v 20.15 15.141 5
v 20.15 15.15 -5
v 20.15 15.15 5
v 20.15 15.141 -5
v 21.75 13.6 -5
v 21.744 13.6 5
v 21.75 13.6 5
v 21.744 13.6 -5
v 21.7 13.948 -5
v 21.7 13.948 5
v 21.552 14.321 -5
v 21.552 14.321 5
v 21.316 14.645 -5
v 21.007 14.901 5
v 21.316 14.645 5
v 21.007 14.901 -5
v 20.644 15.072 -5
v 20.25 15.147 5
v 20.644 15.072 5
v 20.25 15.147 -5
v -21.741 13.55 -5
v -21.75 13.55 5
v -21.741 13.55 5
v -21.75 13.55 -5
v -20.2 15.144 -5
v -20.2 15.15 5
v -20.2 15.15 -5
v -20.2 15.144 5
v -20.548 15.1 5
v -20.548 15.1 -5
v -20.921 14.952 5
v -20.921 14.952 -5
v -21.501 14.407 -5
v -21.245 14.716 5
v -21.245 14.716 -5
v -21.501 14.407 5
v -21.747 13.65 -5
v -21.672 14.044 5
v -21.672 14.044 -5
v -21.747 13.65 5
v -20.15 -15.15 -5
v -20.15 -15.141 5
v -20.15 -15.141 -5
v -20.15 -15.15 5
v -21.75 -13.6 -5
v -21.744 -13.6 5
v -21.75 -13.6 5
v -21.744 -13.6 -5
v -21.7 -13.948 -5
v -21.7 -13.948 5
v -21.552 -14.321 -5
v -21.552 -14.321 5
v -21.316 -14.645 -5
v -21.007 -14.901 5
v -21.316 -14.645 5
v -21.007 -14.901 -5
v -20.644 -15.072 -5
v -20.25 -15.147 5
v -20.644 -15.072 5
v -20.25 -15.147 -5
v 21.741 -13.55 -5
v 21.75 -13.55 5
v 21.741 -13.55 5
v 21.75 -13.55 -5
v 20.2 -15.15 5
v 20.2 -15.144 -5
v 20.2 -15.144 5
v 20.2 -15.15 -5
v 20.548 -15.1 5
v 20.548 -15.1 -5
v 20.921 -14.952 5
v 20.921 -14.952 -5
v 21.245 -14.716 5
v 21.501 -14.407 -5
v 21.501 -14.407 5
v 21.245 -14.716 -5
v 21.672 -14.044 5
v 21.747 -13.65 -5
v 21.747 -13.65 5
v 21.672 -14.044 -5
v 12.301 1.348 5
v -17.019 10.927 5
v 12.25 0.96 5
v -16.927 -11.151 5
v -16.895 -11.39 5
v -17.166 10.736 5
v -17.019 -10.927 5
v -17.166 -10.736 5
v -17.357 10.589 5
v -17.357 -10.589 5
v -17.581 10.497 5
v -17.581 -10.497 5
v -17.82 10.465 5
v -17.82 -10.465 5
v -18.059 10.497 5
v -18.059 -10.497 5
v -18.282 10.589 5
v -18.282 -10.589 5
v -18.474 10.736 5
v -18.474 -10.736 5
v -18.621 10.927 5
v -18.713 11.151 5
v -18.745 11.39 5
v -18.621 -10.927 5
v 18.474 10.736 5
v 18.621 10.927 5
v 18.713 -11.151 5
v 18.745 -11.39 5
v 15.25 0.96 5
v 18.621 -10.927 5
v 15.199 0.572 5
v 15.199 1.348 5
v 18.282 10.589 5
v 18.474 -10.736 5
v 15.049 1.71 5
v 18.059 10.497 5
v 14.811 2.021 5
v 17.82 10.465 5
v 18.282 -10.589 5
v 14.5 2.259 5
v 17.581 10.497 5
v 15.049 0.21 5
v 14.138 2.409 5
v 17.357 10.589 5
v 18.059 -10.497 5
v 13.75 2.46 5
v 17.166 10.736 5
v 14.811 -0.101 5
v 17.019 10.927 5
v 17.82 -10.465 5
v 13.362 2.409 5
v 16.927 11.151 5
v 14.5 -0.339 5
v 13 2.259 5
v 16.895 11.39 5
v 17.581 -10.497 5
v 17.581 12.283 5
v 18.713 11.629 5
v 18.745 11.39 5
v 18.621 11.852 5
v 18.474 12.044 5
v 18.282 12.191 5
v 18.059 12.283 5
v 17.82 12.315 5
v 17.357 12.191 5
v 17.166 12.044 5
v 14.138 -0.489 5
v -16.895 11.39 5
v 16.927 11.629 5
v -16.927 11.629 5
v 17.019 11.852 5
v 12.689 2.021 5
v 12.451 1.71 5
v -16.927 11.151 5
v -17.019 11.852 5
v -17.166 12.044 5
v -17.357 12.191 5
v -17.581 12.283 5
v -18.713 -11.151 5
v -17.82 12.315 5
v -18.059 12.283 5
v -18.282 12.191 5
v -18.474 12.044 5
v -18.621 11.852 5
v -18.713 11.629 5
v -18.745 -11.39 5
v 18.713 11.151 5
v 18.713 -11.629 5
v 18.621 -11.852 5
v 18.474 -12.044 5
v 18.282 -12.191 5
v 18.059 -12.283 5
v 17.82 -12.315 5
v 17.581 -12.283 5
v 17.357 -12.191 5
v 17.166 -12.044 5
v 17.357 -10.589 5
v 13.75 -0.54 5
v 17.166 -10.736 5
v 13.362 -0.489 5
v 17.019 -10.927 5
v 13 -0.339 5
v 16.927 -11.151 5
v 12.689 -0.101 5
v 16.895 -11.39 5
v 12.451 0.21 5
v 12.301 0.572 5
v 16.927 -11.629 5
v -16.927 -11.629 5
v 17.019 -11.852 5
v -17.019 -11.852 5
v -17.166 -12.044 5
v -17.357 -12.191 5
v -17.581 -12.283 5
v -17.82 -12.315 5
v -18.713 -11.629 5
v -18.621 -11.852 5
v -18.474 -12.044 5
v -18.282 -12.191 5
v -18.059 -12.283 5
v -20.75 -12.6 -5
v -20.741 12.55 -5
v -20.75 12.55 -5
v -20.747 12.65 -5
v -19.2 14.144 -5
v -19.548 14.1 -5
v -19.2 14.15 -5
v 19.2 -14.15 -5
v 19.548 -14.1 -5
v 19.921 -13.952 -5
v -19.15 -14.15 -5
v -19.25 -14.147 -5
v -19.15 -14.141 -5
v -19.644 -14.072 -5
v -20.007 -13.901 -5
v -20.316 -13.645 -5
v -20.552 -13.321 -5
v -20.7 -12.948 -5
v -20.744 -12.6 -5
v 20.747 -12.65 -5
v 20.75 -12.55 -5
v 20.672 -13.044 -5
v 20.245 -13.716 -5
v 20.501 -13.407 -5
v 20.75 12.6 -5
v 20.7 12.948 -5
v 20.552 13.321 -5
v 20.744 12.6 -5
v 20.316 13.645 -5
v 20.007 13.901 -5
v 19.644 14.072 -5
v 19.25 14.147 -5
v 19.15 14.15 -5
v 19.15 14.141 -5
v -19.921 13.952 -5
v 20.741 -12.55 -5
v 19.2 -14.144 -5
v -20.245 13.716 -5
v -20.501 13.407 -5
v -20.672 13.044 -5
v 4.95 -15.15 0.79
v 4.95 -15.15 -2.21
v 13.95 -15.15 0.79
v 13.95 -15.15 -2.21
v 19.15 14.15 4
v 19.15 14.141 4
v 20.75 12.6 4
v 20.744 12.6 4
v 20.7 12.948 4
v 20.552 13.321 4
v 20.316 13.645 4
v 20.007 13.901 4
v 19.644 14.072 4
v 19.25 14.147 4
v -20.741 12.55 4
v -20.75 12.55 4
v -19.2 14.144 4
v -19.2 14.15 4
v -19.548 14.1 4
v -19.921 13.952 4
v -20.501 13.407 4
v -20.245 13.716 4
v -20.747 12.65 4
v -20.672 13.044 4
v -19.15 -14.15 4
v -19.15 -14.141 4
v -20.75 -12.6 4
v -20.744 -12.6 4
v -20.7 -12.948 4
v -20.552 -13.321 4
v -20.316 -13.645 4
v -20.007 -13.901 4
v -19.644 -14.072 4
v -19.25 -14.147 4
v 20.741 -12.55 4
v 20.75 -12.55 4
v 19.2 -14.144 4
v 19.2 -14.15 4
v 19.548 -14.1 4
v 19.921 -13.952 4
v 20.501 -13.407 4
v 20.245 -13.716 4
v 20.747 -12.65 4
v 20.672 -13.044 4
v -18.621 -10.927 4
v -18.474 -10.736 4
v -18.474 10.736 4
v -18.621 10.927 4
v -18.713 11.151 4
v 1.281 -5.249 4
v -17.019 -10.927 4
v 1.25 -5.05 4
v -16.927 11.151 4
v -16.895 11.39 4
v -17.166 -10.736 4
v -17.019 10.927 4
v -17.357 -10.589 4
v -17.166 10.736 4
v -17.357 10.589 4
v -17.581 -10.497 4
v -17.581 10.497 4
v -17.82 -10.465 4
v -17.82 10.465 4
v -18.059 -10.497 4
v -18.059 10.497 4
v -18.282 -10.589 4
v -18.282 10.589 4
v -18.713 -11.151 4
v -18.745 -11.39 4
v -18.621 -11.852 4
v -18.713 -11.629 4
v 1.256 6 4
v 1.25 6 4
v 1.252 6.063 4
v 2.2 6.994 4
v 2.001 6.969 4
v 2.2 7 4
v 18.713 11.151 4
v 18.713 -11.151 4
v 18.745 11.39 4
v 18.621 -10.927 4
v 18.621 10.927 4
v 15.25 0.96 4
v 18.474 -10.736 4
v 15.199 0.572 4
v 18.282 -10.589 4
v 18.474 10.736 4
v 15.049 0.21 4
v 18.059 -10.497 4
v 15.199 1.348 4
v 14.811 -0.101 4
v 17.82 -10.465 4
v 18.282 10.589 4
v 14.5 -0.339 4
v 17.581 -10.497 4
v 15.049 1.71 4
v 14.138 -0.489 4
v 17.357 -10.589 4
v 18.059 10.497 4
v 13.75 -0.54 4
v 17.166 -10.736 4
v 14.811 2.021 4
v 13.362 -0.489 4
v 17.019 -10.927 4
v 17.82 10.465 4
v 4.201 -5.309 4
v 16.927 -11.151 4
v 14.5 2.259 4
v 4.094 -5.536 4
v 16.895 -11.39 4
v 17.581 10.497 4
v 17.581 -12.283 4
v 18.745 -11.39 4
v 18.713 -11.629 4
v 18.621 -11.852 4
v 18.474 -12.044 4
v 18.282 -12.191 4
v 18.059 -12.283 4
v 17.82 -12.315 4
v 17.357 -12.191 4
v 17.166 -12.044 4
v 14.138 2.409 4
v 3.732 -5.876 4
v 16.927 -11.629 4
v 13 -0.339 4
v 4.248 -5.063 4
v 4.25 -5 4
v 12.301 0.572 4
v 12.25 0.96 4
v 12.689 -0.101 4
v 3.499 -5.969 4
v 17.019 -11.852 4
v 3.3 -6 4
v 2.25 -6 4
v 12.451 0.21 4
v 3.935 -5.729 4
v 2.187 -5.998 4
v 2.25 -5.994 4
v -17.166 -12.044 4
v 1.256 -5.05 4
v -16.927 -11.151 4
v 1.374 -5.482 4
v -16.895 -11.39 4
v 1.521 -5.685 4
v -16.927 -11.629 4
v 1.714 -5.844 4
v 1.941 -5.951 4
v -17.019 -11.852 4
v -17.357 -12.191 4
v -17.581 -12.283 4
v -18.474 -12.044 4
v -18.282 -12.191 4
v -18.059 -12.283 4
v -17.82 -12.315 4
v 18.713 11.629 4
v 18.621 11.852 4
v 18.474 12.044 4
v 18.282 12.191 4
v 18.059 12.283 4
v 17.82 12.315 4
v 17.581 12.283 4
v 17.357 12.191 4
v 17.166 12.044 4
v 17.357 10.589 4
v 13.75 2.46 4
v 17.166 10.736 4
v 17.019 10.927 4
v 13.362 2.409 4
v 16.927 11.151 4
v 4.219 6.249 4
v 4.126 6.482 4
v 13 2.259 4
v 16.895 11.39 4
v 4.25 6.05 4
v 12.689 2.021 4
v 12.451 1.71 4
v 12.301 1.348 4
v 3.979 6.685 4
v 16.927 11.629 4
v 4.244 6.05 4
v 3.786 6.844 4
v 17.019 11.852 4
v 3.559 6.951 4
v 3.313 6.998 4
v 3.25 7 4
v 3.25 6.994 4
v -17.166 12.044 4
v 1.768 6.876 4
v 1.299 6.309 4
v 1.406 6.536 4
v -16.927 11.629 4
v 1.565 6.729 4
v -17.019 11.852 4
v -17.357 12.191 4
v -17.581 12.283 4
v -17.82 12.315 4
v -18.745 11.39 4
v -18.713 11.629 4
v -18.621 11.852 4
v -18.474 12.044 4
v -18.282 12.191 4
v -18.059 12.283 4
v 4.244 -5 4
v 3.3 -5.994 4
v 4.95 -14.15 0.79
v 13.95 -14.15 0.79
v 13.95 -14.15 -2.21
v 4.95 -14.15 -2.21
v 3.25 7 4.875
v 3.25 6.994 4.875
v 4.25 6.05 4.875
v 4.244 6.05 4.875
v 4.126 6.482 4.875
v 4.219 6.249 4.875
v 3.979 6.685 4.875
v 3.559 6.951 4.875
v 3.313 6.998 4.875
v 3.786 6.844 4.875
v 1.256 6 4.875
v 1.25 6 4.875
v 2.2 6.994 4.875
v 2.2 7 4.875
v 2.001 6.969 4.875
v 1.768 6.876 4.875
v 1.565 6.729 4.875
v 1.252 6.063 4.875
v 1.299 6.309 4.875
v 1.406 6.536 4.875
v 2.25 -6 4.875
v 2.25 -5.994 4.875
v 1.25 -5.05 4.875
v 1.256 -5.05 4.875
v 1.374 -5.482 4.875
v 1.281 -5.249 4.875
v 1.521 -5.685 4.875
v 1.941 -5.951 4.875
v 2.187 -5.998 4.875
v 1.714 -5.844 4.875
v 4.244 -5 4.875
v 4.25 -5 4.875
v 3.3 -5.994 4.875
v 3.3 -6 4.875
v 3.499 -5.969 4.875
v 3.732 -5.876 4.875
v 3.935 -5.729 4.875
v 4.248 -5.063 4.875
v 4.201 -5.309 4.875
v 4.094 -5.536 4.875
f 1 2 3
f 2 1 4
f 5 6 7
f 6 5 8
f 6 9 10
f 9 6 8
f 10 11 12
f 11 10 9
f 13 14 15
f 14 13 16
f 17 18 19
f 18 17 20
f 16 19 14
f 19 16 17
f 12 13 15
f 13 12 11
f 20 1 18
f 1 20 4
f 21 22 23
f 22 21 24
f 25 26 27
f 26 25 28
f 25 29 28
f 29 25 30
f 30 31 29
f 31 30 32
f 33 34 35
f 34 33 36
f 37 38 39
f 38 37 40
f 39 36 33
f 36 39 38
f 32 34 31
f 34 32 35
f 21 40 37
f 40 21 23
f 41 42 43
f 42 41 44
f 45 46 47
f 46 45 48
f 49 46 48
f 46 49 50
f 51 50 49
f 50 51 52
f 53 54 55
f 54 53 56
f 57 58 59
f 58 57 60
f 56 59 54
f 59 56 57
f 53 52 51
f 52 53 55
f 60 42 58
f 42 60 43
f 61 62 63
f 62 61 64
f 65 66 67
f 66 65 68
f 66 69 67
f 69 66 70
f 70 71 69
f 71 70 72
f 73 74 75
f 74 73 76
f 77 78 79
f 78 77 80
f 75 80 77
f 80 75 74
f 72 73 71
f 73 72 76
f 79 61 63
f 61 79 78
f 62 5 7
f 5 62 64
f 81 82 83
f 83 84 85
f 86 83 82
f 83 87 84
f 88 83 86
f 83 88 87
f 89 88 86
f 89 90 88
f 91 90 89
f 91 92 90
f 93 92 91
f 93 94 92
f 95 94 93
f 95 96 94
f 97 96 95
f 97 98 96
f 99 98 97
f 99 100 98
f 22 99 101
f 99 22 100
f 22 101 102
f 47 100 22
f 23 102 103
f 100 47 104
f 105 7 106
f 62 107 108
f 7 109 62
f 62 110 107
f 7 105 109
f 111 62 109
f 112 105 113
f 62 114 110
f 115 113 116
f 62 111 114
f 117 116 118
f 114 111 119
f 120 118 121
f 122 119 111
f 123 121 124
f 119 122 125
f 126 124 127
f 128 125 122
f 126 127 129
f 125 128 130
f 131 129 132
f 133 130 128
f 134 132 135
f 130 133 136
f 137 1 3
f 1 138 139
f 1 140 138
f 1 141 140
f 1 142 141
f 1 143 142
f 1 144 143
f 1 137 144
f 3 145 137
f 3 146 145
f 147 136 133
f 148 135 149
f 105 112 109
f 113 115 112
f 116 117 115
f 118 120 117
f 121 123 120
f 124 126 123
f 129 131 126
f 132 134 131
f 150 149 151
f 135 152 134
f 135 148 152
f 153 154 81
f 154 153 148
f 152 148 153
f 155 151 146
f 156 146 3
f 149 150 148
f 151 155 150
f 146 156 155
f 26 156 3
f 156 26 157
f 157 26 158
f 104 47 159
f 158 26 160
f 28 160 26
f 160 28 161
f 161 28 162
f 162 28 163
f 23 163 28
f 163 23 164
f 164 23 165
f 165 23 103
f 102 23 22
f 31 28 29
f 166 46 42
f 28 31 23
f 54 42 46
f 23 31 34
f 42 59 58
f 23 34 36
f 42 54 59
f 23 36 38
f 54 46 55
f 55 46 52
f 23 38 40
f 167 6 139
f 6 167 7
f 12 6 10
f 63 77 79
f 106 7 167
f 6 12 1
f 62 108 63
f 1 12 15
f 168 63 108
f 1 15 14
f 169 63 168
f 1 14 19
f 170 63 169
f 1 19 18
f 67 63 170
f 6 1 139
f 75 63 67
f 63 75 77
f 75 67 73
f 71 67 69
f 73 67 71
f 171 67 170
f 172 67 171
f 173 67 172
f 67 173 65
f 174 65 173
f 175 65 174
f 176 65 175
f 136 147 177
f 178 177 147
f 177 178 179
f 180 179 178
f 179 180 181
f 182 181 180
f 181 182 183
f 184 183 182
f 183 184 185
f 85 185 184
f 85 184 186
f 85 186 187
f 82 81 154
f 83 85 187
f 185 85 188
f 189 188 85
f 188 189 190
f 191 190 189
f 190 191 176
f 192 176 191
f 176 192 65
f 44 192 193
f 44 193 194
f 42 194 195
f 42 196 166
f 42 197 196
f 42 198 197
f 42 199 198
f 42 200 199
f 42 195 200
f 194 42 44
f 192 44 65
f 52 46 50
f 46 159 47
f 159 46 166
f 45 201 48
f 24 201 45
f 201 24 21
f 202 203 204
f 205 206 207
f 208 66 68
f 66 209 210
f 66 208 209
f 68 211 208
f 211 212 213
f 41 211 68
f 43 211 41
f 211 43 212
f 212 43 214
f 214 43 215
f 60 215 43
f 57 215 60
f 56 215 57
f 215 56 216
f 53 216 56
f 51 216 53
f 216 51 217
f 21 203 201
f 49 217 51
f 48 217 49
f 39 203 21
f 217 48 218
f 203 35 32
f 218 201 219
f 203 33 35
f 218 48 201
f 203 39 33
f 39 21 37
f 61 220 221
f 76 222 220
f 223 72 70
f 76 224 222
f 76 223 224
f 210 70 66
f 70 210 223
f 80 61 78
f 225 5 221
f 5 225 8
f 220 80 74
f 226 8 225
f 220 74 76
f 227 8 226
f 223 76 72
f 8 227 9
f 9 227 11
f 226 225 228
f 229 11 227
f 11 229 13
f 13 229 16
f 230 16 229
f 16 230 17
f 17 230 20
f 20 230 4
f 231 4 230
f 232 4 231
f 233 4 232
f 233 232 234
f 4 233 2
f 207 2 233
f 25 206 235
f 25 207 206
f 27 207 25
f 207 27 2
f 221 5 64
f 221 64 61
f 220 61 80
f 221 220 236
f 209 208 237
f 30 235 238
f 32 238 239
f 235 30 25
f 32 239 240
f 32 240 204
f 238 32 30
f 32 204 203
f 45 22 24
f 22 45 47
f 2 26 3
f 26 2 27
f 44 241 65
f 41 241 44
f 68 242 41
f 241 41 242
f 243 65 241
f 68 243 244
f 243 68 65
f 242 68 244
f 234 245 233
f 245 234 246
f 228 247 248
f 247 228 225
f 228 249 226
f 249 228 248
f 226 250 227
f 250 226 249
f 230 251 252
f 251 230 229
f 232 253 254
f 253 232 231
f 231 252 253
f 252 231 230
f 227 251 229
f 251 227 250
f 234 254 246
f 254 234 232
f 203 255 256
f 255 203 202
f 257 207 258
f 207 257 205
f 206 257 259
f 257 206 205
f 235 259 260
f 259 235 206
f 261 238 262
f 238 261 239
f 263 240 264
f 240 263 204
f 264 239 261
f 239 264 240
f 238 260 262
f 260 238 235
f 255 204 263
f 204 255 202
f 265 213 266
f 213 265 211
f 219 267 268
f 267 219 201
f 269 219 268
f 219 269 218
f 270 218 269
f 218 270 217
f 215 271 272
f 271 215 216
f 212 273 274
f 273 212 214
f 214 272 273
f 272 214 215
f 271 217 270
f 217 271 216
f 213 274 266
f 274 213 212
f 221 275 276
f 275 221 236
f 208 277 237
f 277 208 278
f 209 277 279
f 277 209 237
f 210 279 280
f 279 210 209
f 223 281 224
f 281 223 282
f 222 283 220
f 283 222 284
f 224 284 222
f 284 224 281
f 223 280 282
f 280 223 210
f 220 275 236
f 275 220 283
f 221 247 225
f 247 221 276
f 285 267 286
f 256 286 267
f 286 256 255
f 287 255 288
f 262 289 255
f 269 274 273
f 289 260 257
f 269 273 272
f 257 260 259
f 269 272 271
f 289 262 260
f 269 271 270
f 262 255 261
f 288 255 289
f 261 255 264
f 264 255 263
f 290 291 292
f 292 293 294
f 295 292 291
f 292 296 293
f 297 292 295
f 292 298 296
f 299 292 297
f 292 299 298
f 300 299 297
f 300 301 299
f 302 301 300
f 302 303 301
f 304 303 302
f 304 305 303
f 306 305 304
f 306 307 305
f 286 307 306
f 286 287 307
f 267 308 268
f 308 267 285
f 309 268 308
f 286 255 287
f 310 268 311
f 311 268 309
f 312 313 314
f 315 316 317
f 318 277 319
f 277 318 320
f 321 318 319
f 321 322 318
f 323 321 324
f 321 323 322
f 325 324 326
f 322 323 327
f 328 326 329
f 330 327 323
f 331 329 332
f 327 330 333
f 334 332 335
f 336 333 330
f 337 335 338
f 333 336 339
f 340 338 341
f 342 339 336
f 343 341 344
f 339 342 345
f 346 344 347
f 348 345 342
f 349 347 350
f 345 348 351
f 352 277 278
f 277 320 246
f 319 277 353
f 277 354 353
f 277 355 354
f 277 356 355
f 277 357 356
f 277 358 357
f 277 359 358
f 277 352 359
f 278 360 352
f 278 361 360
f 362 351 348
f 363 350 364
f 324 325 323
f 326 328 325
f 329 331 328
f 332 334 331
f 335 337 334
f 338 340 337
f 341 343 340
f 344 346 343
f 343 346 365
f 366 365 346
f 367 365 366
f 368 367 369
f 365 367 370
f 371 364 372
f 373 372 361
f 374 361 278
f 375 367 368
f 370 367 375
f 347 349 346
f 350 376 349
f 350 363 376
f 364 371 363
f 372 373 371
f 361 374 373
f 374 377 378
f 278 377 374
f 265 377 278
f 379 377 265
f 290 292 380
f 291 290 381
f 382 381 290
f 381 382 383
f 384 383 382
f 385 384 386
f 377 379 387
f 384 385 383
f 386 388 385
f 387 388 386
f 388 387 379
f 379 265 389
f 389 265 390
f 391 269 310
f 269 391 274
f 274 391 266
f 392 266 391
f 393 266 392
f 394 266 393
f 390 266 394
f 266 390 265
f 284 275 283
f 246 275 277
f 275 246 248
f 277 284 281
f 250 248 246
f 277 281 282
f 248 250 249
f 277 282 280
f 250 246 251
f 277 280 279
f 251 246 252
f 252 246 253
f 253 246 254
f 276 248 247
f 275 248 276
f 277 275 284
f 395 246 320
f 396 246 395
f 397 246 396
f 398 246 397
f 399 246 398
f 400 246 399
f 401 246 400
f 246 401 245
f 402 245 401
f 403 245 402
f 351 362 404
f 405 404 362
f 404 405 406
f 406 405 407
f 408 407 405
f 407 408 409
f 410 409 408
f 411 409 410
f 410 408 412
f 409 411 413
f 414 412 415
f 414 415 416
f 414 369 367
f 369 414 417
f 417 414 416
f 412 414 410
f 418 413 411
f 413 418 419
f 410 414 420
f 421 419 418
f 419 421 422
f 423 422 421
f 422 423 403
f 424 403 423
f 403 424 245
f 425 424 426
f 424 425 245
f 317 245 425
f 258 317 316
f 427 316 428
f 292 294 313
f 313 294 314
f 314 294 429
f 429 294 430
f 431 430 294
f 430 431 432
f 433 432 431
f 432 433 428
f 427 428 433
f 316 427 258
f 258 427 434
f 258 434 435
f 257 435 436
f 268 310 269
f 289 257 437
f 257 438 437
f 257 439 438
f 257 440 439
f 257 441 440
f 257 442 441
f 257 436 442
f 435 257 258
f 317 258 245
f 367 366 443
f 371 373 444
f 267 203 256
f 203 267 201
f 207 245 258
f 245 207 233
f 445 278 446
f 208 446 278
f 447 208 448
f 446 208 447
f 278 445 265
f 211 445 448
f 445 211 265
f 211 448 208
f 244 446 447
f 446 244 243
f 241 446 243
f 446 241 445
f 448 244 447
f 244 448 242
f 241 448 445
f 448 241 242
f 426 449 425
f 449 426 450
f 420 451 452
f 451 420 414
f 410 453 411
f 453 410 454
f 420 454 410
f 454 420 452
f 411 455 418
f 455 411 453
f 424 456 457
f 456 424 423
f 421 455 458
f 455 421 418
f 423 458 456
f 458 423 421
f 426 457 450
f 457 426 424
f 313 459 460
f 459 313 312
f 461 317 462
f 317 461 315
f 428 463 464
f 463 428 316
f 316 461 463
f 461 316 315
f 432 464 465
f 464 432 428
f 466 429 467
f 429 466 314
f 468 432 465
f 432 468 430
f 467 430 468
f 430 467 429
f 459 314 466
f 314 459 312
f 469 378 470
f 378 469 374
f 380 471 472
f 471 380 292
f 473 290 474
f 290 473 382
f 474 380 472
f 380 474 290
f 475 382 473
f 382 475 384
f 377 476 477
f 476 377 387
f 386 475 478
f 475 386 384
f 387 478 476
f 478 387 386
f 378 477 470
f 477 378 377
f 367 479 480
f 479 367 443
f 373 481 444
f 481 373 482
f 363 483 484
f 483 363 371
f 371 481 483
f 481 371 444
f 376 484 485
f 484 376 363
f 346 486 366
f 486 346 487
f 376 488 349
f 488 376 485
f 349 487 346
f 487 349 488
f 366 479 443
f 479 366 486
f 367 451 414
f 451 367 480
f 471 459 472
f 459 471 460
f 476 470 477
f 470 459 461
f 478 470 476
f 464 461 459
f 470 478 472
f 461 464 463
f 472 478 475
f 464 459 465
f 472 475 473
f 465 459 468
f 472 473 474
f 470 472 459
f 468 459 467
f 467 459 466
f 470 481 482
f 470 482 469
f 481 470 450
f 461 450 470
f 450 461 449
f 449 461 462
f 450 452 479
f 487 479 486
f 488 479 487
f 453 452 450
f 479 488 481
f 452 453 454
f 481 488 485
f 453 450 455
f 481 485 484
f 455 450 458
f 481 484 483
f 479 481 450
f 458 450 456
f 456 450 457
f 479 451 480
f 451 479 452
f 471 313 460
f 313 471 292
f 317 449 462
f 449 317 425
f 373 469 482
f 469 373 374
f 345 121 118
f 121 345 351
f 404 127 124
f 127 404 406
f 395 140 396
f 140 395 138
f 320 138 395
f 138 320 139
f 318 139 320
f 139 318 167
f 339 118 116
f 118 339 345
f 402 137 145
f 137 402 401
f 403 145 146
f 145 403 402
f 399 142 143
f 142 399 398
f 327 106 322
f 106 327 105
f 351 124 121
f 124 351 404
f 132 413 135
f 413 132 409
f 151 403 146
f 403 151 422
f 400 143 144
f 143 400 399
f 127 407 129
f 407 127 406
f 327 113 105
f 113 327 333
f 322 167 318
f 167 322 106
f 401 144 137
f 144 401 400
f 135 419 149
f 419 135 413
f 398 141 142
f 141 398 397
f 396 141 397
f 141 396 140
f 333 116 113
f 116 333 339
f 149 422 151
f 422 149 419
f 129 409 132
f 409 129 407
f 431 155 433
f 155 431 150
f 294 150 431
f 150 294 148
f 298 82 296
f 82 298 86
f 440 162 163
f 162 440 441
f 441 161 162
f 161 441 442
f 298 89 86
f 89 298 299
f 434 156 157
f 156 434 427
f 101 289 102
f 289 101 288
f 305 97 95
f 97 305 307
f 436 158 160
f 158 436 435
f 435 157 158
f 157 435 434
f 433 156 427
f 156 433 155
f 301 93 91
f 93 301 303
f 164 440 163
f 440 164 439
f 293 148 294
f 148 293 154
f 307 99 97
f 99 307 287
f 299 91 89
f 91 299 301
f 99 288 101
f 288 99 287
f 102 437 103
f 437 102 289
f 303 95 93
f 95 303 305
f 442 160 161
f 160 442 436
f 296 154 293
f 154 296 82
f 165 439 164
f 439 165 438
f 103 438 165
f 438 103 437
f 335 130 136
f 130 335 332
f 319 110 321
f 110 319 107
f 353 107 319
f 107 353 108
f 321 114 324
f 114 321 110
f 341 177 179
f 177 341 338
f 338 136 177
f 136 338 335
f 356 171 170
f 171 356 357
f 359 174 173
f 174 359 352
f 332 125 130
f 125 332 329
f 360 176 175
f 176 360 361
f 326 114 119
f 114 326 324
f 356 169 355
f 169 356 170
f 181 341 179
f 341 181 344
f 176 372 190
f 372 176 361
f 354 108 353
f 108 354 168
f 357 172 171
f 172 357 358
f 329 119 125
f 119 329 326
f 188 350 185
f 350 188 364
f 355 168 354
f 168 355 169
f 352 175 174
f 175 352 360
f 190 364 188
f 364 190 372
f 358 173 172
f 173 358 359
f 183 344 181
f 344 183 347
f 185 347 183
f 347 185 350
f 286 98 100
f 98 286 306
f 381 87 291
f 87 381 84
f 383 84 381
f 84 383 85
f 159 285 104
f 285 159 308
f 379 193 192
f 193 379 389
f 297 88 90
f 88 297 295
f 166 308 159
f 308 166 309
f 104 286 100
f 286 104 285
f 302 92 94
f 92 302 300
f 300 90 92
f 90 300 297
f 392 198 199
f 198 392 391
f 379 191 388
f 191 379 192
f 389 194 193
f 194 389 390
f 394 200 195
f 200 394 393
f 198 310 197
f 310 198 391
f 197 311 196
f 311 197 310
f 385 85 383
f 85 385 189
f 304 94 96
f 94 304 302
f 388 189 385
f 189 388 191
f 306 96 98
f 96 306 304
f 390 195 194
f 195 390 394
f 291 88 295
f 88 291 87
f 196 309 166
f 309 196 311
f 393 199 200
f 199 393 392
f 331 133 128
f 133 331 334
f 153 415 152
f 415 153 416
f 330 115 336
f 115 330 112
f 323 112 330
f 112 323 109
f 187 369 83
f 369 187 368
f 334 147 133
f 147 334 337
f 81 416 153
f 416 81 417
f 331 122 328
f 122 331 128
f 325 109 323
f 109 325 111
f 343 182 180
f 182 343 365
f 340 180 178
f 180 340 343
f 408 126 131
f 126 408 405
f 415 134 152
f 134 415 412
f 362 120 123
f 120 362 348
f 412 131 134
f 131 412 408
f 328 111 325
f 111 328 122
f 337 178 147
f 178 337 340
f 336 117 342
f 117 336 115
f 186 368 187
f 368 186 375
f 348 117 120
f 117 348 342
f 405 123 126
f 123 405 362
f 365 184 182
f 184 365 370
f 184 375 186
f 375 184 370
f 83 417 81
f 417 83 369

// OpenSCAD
/*

Modified use of Sergio Vilches RoundedCornersCube Modules for OpenSCAD to generate cover for Matt Venn's EnergyWristband project https://github.com/mattvenn/energy-wristband

http://codeviewer.org/view/code:1b36 
Copyright (C) 2011 Sergio Vilches
This program is free software: you can redistribute it and/or modify it under the terms of the GNU General Public License as published by the Free Software Foundation, either version 3 of the License, or (at your option) any later version.
This program is distributed in the hope that it will be useful, but WITHOUT ANY WARRANTY; without even the implied warranty of MERCHANTABILITY or FITNESS FOR A PARTICULAR PURPOSE. See the GNU General Public License for more details. You should have received a copy of the GNU General Public License along with this program. If not, see <http://www.gnu.org/licenses/>.
Contact: s.vilches.e@gmail.com


    ----------------------------------------------------------- 
                 Round Corners Cube (Extruded)                
      roundCornersCube(x,y,z,r) Where:                        
         - x = Xdir width                                     
         - y = Ydir width                                     
         - z = Height of the cube                             
         - r = Rounding radious                               
                                                              
      Example: roundCornerCube(10,10,2,1);                    
     *Some times it's needed to use F6 to see good results!   
 	 ----------------------------------------------------------- 
*/

// Main Box Inner Dimensions
x1=41.5;
y1 = 28.3;
//height of cover flush with base or board
//allowing 0.5mm for lipo battery
z1=8;
//rounding radius
r = 1.6;
//thickness of case
thickness = 2;
//distance from base of the usb port
usbheightfrombase = 1.79;

//remove the srew hole and button material 
difference(){
mycover();
myscrews_button(1.85, 2.93, 2.76);
}


//custom module definitions

module myscrews_button(screwdiameter, xdistfromcorner, ydistfromcorner){
//position of button hole and radii of screws & buttons
xbuttondistfromedge = 7;
//offet from centre on y axis of the button
ybuttondistfromcentre = 0.96;
buttondiameter = 3;
buttonradius = buttondiameter/2;
screwradius = screwdiameter/2;
//position of recess to view the LEDs
leddistfromedge = 18;

	translate([x1/2-xdistfromcorner, y1/2-ydistfromcorner,(z1/2)-z1])cylinder(h=z1*2, r=screwradius,center=false, $fn=24);
translate([-x1/2+xdistfromcorner, y1/2-ydistfromcorner,(z1/2)-1])cylinder(h=10, r=screwradius,center=false, $fn=24);
translate([x1/2-xdistfromcorner, -y1/2+ydistfromcorner,(z1/2)-1])cylinder(h=10, r=screwradius,center=false, $fn=24);
translate([-x1/2+xdistfromcorner, -y1/2+ydistfromcorner,(z1/2)-1])cylinder(h=10, r=screwradius,center=false, $fn=24);
//button hole
translate([x1/2-xbuttondistfromedge, ybuttondistfromcentre,(z1/2)-1])cylinder(h=z1, r=buttonradius,center=false, $fn=24);
//ledviewer
translate([x1/2-leddistfromedge, 0.5,(z1/2)-1])roundCornersCube(3,13,z1/2-0.25,1);

}

//remove the usb port material

module mycover(){
difference(){
mybox();
translate([(x1/2)-(7.9*2),-(y1/2)-2 ,(-z1/2)+(usbheightfrombase)])myusb();
}
}

// the basic box
module mybox(){
 difference(){
	roundCornersCube(x1+thickness, y1 + thickness, z1 + thickness,r);
	translate ([0, 0,(z1/2)-5])roundCornersCube(x1,y1,z1+thickness,r);
}
}

//the microusbcharger port
module myusb(){	
usbx = 9;
usby = 3;
usbz = 3;

cube([usbx, usby, usbz], center = false);
}

//original module functions Copyright (C) 2011 Sergio Vilches

module createMeniscus(h,radius) 
// This module creates the shape that needs to be substracted from a cube to make its corners rounded.
//basicly the difference between a quarter of cylinder and a cube
difference(){        

   translate([radius/2+0.1,radius/2+0.1,0]){
      cube([radius+0.2,radius+0.1,h+0.2],center=true);         // All that 0.x numbers are to avoid "ghost boundaries" when substracting
   }

   cylinder(h=h+0.2,r=radius,$fn = 25,center=true);
}


module roundCornersCube(x,y,z,r)  // Now we just substract the shape we have created in the four corners
difference(){
   cube([x,y,z], center=true);

translate([x/2-r,y/2-r]){  // We move to the first corner (x,y)
      rotate(0){  
         createMeniscus(z,r); // And substract the meniscus
      }
   }
   translate([-x/2+r,y/2-r]){ // To the second corner (-x,y)
      rotate(90){
         createMeniscus(z,r); // But this time we have to rotate the meniscus 90 deg
      }
   }
      translate([-x/2+r,-y/2+r]){ // ... 
      rotate(180){
         createMeniscus(z,r);
      }
   }
      translate([x/2-r,-y/2+r]){
      rotate(270){
         createMeniscus(z,r);
      }
   }
}
